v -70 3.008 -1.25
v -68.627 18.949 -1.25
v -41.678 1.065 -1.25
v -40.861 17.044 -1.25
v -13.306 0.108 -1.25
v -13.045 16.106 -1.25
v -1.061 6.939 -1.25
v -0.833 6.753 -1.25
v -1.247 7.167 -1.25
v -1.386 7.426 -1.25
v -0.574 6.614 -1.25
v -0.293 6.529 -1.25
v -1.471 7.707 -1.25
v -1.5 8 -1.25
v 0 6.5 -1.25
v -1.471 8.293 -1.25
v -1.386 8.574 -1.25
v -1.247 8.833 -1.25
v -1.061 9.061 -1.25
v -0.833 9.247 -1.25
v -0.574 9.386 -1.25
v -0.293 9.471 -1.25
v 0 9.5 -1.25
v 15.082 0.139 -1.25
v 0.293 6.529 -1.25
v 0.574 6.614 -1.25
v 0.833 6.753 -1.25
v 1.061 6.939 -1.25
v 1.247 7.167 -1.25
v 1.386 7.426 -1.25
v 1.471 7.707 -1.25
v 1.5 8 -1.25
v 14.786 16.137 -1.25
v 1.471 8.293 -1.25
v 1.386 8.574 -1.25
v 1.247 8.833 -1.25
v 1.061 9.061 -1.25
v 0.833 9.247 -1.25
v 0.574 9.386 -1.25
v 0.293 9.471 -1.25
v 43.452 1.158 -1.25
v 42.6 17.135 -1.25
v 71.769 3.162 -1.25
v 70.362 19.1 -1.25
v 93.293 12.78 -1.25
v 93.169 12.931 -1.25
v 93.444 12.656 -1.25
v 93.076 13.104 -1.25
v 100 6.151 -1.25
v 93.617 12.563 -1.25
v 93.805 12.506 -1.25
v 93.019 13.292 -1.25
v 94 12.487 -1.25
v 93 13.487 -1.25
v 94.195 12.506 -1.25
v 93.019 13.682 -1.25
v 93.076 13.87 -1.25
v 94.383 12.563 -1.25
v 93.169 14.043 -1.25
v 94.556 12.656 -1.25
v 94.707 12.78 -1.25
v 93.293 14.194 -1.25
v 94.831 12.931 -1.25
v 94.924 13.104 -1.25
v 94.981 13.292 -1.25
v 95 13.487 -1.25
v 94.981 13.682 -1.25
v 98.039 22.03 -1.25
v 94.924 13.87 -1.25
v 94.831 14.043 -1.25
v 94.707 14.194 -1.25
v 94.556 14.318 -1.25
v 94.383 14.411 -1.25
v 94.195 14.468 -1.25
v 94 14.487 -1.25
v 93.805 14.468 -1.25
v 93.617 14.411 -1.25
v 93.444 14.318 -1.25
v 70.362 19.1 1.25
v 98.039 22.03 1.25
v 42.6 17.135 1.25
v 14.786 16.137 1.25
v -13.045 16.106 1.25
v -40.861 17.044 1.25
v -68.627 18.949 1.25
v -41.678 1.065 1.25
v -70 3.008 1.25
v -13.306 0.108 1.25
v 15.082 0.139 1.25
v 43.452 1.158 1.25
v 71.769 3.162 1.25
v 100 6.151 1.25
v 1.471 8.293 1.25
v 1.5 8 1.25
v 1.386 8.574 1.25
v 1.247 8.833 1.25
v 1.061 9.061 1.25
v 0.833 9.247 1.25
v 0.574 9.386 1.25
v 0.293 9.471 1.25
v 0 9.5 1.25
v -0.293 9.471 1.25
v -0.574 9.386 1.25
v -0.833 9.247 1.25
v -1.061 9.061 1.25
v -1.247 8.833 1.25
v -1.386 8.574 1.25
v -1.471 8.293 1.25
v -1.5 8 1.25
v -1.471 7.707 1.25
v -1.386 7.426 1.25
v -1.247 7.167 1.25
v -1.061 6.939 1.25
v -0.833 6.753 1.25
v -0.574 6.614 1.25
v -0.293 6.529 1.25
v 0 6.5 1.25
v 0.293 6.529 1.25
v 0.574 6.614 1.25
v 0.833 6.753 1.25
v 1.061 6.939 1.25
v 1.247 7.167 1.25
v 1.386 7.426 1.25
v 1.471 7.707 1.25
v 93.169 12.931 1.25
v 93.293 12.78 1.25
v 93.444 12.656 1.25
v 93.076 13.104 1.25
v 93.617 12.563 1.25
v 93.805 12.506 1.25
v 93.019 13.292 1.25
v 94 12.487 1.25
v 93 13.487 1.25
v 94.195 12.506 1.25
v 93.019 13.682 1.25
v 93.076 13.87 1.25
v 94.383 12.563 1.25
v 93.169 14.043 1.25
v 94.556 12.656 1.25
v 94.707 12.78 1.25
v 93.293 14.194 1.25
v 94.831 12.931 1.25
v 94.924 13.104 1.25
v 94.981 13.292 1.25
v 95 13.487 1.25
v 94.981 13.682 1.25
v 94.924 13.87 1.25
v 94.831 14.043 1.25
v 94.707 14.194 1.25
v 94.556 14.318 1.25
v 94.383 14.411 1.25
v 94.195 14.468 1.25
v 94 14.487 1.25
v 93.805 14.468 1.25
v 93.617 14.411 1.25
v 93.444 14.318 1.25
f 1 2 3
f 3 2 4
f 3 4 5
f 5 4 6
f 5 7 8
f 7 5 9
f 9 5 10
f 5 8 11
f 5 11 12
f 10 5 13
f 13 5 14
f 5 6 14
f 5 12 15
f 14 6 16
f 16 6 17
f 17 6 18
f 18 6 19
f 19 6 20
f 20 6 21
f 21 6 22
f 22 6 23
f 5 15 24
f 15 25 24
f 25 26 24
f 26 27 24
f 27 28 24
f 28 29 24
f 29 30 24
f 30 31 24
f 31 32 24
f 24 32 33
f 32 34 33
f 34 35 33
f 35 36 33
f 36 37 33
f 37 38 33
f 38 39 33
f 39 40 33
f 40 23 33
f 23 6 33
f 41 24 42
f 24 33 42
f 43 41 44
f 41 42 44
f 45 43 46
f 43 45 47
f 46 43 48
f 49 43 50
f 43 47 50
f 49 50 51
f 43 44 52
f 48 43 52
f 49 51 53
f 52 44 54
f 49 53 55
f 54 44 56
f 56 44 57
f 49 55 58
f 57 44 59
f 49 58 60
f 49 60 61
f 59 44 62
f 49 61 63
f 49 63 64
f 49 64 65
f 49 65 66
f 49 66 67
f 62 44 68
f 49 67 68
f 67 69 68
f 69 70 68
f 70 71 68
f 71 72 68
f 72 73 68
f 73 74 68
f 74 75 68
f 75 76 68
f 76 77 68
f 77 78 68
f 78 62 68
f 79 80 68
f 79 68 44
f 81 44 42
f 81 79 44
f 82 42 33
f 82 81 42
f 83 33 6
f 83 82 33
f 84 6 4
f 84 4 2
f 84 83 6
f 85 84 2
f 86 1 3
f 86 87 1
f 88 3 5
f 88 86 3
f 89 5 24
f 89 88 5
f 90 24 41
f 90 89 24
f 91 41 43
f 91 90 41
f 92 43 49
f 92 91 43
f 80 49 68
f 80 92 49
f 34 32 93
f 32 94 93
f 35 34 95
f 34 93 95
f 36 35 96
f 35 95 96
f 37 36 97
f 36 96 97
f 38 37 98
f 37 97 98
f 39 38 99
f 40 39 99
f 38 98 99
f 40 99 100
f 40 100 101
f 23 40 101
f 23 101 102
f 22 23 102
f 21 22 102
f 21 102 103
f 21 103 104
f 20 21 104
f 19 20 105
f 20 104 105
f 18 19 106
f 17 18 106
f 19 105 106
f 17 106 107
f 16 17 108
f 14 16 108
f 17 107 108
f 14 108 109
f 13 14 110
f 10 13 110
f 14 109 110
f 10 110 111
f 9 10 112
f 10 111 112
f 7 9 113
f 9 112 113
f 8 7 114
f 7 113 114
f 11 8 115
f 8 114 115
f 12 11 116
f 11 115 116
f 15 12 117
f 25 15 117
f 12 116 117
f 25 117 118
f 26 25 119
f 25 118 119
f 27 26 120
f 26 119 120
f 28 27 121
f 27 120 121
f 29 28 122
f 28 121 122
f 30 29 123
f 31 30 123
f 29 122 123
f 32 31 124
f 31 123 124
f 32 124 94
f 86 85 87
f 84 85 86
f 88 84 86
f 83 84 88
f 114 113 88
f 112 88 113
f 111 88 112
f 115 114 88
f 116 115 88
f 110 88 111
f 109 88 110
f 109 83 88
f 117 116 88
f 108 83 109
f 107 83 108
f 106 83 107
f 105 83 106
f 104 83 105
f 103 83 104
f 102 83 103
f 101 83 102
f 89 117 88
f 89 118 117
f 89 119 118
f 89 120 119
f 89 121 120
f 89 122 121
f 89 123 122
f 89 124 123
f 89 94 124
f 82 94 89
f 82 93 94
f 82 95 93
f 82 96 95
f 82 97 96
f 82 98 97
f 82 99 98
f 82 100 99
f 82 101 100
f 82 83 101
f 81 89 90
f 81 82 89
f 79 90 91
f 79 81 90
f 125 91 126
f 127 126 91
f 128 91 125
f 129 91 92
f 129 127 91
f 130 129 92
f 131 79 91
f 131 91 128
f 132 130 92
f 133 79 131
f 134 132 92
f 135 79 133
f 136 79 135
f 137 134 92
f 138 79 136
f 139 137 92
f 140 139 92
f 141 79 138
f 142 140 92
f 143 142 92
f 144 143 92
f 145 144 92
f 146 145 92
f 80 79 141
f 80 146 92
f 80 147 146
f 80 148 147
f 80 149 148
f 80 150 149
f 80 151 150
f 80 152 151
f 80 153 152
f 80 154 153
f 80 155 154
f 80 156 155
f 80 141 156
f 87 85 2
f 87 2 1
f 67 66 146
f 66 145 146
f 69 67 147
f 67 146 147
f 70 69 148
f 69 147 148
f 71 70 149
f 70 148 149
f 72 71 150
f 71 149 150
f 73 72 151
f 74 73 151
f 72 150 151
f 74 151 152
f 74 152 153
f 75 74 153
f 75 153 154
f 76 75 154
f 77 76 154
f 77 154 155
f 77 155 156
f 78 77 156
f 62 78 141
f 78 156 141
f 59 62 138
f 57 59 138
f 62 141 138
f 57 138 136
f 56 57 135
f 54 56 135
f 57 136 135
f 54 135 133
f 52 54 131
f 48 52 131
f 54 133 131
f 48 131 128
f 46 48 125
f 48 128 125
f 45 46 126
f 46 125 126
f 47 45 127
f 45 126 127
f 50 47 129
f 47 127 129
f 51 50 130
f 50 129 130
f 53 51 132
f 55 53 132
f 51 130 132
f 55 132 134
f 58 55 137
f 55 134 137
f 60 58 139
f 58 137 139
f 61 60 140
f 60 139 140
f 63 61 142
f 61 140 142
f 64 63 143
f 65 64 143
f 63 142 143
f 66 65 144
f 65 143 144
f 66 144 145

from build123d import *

# Parameters (mm, degrees)
BOSS_EXTRUDE1_DEPTH = 1.25
SKETCH2_R           = 1.5
CUT_EXTRUDE1_DEPTH  = 10
SKETCH3_R           = 1
CUT_EXTRUDE2_DEPTH  = 10


with BuildPart() as part:
    # Sketch1 → Boss-Extrude1 (new, symmetric)
    with BuildSketch(Plane.XY):
        with BuildLine():
            Line((100, 6.15063129), (98.039215686, 22.030030676))
            ThreePointArc((98.039215686, 22.030030676), (14.786349801, 16.13665926), (-68.62745098, 18.949014823))
            Line((-68.62745098, 18.949014823), (-70, 3.007995119))
            ThreePointArc((-70, 3.007995119), (15.082076797, 0.139392445), (100, 6.15063129))
        make_face()
    extrude(amount=BOSS_EXTRUDE1_DEPTH, both=True)

    # Sketch2 → Cut-Extrude1 (cut, symmetric)
    with BuildSketch(Plane.XY):
        with Locations((0, 8)):
            Circle(SKETCH2_R)
    extrude(amount=CUT_EXTRUDE1_DEPTH, both=True, mode=Mode.SUBTRACT)

    # Sketch3 → Cut-Extrude2 (cut, symmetric)
    with BuildSketch(Plane.XY):
        with Locations((94, 13.486995845)):
            Circle(SKETCH3_R)
    extrude(amount=CUT_EXTRUDE2_DEPTH, both=True, mode=Mode.SUBTRACT)


solid = part.part
